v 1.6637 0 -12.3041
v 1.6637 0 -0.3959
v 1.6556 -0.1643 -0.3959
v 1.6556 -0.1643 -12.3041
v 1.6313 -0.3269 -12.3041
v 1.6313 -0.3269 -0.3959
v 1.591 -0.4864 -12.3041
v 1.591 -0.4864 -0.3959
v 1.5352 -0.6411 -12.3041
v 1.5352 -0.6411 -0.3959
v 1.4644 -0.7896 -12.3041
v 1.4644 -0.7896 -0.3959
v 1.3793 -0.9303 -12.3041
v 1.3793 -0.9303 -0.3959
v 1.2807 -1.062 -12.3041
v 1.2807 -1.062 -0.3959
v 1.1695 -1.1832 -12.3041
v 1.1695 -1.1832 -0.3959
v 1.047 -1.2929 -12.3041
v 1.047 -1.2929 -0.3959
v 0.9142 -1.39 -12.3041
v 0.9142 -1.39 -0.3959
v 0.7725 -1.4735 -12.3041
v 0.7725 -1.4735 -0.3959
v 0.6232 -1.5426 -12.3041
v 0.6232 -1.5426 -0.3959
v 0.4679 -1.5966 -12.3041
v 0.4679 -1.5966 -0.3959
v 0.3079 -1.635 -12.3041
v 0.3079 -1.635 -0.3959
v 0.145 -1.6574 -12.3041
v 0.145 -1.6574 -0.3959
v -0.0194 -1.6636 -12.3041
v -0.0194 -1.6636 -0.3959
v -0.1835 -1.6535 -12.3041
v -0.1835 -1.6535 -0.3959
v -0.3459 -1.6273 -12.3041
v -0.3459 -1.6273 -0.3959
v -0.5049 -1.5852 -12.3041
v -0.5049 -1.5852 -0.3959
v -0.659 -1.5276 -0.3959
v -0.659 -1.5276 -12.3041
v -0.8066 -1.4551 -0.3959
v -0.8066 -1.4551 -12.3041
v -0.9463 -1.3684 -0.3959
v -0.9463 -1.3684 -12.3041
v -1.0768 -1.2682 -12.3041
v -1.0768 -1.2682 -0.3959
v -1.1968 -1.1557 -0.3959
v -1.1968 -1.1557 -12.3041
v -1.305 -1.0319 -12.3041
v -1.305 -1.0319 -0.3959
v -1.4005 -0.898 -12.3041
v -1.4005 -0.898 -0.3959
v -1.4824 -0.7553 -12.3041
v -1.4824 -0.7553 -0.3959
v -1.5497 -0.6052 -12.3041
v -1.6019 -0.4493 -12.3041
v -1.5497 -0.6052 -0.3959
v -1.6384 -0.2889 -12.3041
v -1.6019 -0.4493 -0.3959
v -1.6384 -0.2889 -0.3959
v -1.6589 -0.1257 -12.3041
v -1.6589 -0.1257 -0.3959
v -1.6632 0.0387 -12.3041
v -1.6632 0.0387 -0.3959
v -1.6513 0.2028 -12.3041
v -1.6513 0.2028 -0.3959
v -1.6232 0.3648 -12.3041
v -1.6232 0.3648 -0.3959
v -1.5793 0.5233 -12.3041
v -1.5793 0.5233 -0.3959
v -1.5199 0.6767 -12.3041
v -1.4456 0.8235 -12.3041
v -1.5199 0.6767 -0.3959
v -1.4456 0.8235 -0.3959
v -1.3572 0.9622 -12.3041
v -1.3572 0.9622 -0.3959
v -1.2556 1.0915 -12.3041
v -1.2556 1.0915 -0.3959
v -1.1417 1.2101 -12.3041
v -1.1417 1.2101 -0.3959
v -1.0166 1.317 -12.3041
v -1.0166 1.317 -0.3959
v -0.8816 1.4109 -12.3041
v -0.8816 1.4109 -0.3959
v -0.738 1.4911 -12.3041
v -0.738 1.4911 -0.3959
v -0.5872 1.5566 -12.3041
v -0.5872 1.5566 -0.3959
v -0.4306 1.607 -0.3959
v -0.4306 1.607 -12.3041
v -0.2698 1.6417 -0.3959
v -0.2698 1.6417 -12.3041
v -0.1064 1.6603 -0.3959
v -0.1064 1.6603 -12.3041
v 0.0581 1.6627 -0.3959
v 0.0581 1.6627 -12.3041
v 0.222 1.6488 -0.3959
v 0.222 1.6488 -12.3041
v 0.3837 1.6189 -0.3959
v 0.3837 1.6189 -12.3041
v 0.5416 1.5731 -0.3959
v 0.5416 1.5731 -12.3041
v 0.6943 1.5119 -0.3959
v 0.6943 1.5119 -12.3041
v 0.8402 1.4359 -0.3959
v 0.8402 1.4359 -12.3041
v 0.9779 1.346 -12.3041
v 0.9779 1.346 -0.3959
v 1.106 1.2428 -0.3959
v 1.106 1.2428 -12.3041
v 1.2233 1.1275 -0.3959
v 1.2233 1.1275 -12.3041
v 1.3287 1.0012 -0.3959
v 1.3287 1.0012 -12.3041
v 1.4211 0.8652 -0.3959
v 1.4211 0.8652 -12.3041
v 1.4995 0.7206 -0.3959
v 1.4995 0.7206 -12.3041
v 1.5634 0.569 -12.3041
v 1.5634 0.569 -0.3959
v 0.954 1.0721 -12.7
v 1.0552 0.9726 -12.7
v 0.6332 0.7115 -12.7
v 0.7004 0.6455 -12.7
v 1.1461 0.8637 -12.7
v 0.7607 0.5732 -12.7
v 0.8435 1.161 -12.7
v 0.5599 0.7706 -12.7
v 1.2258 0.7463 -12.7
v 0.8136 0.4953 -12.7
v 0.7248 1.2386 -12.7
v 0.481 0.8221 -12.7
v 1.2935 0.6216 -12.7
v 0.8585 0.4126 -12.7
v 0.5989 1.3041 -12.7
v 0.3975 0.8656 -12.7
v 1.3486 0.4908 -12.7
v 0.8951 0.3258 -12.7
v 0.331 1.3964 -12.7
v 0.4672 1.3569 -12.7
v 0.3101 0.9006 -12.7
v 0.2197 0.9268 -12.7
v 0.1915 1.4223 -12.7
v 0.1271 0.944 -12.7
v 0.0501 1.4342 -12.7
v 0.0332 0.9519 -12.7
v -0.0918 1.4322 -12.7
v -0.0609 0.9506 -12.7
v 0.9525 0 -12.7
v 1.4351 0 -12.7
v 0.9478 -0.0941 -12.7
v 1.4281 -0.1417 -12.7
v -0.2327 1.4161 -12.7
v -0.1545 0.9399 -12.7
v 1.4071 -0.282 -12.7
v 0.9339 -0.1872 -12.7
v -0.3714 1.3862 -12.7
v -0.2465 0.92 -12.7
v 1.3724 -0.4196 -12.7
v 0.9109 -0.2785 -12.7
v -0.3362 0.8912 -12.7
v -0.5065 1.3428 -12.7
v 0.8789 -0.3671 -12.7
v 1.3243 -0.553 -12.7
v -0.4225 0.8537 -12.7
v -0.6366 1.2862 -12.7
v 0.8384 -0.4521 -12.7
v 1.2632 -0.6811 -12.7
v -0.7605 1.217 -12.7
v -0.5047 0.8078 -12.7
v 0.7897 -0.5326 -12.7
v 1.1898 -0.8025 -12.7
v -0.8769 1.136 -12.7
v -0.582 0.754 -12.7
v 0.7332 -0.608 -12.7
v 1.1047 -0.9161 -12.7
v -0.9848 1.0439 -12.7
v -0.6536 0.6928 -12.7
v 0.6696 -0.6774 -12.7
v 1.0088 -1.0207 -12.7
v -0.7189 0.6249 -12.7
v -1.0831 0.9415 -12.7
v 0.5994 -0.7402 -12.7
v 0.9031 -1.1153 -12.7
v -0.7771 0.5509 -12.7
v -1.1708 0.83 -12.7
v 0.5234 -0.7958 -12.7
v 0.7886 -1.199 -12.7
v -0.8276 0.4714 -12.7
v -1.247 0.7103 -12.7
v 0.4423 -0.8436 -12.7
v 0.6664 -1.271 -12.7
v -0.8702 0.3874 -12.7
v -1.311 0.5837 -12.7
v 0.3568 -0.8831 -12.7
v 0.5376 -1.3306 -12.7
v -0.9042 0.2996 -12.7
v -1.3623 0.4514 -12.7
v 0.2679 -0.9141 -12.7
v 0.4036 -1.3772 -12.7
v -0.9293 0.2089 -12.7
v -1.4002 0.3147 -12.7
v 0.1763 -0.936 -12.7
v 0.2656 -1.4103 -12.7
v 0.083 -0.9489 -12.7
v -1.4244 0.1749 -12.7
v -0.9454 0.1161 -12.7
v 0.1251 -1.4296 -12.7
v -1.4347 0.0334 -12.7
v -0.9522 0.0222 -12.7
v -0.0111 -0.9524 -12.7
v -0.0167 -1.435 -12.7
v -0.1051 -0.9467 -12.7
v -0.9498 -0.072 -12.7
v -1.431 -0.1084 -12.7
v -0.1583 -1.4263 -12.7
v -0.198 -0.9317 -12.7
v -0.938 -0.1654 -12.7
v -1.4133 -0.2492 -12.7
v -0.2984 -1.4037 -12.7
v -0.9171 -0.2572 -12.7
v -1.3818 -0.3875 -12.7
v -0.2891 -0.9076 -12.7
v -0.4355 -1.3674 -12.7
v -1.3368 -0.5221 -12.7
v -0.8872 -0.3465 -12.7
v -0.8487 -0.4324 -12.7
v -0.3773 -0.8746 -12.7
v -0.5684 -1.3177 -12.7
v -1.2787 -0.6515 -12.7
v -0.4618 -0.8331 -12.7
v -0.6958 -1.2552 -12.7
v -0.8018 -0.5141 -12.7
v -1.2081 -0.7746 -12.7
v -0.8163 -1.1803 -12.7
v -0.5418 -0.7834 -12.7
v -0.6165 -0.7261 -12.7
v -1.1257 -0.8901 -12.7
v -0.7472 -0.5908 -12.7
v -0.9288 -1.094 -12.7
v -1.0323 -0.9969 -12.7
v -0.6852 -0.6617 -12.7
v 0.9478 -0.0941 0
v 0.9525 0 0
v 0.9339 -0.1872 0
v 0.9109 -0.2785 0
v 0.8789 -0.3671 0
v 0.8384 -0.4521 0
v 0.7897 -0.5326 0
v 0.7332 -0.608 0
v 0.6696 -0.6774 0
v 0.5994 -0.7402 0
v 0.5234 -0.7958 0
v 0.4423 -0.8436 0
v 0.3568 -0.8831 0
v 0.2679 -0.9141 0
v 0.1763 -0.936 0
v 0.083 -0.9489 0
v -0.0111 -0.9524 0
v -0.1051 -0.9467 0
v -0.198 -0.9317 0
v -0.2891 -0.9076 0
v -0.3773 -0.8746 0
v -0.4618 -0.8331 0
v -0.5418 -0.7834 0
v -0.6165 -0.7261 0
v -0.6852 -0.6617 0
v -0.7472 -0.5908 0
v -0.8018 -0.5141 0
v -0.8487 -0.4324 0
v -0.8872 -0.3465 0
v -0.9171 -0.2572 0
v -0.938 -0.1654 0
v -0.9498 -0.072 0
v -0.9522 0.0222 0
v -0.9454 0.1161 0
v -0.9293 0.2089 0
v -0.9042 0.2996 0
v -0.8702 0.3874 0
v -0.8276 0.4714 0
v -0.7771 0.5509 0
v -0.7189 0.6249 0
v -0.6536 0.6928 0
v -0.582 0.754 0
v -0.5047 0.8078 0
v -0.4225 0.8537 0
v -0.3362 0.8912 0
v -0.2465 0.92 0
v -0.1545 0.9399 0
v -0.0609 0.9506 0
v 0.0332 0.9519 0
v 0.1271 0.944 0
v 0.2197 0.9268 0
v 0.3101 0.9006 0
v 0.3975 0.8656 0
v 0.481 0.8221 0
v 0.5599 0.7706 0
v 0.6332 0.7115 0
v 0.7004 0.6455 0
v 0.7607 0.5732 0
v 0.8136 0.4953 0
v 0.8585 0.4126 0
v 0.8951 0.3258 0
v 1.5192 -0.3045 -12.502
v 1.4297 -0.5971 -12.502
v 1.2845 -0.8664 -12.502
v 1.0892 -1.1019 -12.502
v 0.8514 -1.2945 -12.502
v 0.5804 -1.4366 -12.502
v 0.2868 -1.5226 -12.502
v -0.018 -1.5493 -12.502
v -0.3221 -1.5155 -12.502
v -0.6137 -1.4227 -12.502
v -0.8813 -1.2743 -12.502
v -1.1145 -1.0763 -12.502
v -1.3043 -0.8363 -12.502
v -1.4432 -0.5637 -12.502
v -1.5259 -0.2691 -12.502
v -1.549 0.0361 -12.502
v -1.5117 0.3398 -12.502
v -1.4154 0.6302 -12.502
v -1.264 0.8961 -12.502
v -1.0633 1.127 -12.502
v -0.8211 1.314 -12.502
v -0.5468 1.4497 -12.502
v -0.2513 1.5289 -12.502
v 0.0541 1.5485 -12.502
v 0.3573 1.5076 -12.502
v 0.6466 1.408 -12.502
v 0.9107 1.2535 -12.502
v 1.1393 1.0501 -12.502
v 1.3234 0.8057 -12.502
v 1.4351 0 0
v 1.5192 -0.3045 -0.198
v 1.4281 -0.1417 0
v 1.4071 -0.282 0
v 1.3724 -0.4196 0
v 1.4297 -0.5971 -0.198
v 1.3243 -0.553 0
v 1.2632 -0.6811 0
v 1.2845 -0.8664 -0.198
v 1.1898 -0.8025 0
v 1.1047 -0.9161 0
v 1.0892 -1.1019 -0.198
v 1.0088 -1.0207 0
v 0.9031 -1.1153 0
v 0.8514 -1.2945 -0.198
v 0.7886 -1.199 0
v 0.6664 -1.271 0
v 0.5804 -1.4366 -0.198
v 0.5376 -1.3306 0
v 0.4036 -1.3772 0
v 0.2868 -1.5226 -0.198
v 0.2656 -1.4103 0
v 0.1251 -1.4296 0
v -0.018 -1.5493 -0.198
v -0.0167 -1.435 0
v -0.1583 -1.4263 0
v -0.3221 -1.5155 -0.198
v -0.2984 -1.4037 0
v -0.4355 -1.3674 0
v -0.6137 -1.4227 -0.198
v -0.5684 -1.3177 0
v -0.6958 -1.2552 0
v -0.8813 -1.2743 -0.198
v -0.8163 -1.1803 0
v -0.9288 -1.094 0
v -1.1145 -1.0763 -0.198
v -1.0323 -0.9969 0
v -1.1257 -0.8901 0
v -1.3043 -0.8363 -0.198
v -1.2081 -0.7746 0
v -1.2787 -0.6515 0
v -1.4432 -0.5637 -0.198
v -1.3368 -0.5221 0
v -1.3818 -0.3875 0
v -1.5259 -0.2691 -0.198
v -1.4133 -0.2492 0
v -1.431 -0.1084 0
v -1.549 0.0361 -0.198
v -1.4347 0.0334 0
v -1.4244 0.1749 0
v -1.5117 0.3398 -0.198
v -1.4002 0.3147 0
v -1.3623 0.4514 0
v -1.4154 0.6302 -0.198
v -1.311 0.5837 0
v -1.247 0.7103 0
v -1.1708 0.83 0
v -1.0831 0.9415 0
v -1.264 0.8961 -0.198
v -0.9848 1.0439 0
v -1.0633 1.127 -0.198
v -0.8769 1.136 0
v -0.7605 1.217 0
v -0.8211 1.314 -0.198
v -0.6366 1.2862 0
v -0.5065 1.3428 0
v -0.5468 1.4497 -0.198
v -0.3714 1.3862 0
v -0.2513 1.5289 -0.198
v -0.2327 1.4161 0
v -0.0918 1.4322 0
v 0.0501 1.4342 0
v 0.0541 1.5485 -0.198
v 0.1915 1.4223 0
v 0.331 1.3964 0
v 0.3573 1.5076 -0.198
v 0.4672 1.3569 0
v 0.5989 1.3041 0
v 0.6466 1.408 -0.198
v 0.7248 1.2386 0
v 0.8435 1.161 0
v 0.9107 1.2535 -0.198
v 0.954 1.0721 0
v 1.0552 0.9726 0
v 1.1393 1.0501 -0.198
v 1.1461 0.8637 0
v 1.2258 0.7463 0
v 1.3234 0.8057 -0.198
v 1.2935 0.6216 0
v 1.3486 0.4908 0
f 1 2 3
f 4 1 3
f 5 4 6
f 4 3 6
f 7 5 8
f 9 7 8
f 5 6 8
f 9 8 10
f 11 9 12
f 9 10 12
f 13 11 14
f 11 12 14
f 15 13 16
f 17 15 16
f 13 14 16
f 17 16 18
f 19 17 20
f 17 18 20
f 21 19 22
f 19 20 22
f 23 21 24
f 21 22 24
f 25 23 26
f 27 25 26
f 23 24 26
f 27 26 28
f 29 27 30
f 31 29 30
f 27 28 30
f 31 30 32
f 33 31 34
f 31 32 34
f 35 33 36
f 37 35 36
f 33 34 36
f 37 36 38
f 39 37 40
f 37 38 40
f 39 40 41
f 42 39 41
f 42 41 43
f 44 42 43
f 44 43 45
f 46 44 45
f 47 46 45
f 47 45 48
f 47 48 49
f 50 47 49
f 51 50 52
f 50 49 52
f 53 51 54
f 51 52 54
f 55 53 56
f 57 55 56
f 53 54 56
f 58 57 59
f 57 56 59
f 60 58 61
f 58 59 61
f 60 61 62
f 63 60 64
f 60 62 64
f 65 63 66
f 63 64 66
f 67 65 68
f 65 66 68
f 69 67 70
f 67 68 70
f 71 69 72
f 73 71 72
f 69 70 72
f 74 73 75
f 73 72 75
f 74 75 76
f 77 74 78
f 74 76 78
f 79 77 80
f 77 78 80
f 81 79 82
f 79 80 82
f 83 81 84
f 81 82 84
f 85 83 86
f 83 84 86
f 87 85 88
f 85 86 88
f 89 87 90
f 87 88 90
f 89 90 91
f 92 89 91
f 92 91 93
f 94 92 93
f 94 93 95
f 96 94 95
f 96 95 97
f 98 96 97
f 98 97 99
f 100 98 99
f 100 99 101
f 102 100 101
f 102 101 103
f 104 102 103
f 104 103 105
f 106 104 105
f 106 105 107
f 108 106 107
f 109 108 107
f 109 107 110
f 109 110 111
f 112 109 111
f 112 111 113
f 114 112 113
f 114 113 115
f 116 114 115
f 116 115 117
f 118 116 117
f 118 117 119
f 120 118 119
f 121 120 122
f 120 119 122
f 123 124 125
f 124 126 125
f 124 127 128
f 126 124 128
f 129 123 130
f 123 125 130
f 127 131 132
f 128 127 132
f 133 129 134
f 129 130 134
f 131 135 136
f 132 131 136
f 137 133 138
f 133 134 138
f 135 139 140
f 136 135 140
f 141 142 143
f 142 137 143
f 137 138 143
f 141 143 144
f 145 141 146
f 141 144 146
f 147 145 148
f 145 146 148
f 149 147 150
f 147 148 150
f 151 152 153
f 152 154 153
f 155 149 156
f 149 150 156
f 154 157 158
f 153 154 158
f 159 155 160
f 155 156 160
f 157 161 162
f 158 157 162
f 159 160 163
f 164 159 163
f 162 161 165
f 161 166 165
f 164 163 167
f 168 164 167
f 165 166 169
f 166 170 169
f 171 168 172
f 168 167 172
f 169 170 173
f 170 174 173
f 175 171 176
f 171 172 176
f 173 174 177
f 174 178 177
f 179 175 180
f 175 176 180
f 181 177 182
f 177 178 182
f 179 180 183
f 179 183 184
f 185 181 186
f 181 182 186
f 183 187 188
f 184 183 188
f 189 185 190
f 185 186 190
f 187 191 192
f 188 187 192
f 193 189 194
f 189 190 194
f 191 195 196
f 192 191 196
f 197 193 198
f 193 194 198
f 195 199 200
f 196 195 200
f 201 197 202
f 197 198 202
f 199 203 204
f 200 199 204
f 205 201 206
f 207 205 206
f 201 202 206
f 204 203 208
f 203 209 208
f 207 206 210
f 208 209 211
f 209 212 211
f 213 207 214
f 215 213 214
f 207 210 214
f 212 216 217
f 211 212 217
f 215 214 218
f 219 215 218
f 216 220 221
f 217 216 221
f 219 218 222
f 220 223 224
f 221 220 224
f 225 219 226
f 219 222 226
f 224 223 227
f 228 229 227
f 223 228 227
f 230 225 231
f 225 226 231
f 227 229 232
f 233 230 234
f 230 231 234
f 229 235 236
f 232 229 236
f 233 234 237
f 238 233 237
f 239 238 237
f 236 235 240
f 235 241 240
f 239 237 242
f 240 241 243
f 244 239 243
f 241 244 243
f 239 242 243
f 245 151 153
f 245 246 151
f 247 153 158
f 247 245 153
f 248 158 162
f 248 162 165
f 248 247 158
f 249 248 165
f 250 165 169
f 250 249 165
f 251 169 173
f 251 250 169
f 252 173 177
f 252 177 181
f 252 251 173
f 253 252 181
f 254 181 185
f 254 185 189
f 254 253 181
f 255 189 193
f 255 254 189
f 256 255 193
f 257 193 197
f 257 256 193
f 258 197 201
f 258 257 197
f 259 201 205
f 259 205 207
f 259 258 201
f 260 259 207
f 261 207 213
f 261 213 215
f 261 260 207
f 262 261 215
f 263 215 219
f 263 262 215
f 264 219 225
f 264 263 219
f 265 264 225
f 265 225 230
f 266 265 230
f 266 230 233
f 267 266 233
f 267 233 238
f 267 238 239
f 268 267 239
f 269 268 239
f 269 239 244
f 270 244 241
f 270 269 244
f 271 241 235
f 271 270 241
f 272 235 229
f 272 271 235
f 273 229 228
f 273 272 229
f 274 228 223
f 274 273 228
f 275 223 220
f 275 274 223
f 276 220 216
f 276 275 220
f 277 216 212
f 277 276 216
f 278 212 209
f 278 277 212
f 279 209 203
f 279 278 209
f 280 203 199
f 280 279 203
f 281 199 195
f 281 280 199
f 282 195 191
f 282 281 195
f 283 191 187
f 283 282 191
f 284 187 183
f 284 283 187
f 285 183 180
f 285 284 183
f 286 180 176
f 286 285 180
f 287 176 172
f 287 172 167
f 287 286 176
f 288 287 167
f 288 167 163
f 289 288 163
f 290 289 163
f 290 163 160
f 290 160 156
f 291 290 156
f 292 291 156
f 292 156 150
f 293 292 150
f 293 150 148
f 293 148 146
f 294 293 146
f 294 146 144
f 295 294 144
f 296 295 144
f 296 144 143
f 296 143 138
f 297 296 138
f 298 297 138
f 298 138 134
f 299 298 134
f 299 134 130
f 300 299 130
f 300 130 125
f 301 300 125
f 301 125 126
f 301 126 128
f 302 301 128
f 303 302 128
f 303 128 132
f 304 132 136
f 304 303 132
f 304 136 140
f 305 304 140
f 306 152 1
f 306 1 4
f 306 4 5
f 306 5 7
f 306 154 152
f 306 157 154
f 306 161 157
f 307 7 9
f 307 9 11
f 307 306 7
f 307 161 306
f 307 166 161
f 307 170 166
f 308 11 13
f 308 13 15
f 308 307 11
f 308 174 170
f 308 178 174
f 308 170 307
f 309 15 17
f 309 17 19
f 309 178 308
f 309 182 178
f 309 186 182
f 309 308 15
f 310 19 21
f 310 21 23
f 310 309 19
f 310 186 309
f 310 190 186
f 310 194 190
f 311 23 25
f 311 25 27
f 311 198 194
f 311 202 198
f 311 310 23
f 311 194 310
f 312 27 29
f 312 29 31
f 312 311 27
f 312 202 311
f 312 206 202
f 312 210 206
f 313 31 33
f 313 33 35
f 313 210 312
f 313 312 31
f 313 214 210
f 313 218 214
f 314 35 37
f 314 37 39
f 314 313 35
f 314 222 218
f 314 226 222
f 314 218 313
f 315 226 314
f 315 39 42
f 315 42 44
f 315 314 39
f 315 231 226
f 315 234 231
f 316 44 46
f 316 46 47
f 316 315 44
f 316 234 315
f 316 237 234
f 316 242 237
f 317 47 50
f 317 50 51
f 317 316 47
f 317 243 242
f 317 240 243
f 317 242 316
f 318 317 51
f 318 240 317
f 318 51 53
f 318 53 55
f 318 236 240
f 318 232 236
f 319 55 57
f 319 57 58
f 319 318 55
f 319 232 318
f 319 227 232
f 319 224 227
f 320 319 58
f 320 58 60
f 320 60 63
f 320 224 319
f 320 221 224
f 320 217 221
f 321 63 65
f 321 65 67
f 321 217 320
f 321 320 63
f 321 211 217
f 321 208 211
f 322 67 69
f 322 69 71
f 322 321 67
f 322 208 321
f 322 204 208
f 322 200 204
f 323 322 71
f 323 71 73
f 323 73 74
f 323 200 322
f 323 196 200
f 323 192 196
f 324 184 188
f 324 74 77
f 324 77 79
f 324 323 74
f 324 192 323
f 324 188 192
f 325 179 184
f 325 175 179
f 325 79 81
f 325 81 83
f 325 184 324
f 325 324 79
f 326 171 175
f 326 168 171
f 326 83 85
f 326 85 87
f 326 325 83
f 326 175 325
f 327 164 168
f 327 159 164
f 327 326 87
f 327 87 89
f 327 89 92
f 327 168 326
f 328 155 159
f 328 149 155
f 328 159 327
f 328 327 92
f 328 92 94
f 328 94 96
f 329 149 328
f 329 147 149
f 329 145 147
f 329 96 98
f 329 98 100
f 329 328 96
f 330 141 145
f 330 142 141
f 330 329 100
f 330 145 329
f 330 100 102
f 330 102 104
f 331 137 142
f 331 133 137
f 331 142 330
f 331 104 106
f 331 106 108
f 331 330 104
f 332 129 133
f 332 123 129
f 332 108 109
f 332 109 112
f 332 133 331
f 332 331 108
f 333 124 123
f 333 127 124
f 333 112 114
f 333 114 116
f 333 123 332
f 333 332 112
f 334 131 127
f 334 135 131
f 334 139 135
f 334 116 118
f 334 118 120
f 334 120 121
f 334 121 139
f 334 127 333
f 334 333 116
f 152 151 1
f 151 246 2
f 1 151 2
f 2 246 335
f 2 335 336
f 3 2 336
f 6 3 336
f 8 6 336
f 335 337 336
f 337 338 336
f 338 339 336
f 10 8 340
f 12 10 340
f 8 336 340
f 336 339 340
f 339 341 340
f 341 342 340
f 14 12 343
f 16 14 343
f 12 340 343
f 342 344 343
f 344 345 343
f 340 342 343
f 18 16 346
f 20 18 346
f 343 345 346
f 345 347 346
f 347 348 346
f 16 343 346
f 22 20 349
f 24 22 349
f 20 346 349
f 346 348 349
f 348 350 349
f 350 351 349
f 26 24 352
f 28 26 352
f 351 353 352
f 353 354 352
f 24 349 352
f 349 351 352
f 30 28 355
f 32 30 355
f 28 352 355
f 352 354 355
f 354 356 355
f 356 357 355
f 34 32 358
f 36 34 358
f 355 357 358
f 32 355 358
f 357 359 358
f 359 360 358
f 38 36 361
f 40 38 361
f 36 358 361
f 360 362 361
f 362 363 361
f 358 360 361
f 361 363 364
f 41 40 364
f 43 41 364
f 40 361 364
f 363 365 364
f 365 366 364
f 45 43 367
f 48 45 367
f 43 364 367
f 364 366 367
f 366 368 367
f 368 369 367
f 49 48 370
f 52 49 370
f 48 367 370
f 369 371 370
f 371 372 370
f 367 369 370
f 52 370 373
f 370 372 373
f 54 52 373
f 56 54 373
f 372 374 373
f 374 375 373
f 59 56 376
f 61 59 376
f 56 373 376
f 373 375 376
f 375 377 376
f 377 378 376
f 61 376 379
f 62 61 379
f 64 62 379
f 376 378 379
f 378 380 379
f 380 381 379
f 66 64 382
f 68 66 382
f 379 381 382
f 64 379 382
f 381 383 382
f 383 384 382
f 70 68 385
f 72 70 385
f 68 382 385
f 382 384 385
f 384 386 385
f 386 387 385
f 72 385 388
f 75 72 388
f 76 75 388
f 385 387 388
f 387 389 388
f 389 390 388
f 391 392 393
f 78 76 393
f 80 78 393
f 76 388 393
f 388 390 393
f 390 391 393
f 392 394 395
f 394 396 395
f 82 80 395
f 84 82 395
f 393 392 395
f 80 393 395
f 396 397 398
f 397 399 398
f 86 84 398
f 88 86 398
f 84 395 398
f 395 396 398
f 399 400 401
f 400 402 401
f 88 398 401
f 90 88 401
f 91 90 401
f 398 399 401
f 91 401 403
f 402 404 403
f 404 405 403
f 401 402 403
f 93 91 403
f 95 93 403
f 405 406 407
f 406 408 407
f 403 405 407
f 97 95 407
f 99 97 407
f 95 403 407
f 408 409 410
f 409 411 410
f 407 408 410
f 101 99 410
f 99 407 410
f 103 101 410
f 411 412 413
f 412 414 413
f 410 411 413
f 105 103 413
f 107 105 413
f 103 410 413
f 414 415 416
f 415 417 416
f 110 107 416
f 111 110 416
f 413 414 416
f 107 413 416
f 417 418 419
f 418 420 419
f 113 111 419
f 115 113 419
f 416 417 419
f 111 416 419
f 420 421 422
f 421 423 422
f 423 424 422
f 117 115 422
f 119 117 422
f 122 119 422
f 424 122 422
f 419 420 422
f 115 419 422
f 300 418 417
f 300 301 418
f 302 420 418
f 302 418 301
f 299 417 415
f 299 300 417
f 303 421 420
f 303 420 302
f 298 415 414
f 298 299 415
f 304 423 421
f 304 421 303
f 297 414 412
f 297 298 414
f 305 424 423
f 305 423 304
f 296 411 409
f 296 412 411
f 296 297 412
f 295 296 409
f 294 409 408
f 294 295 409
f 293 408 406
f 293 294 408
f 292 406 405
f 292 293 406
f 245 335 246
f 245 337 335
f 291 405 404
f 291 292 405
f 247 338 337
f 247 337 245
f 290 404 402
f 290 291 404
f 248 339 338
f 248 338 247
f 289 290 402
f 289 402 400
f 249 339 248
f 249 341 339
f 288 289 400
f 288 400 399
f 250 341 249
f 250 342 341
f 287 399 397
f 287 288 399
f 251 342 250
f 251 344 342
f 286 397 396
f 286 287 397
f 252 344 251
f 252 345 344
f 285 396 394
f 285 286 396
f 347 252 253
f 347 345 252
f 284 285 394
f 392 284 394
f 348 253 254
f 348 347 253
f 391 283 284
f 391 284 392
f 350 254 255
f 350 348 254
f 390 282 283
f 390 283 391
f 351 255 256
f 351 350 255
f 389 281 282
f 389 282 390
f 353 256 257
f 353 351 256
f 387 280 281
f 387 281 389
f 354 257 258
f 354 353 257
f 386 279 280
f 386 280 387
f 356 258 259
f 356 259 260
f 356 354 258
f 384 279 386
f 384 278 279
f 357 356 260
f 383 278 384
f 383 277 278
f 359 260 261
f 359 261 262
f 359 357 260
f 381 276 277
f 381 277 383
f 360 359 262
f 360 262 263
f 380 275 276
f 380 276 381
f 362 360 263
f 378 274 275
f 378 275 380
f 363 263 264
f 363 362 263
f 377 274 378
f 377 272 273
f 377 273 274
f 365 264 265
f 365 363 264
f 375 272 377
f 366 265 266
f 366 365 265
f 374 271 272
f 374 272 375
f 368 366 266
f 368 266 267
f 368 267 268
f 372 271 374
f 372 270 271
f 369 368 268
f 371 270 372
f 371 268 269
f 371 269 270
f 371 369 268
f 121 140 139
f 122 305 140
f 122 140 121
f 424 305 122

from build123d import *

# Parameters (mm, degrees)
F0_W     = 0.7112
F0_H     = 12.7
F2_ANGLE = 340
F3_SIZE2 = 0.2286
F3_SIZE  = 0.3959468146


with BuildPart() as f2:
    # F0 (on Front) → F2 (revolve)
    with BuildSketch(Plane.XZ):
        with Locations((1.3081, -6.35)):
            Rectangle(F0_W, F0_H)
    revolve(axis=Axis((0, 0, -8.318349719), (0, 0, -1)), revolution_arc=F2_ANGLE)

    # F3
    f3_edges = [f2.edges().sort_by_distance(p)[0] for p in [
        (-1.638425, -0.288898, 0),
        (-1.638425, -0.288898, -12.7),
    ]]
    f3_side = f2.faces().sort_by_distance((-1.638425, -0.288898, -6.35))[0]
    chamfer(f3_edges, length=F3_SIZE, length2=F3_SIZE2, reference=f3_side)


solid = f2.part
